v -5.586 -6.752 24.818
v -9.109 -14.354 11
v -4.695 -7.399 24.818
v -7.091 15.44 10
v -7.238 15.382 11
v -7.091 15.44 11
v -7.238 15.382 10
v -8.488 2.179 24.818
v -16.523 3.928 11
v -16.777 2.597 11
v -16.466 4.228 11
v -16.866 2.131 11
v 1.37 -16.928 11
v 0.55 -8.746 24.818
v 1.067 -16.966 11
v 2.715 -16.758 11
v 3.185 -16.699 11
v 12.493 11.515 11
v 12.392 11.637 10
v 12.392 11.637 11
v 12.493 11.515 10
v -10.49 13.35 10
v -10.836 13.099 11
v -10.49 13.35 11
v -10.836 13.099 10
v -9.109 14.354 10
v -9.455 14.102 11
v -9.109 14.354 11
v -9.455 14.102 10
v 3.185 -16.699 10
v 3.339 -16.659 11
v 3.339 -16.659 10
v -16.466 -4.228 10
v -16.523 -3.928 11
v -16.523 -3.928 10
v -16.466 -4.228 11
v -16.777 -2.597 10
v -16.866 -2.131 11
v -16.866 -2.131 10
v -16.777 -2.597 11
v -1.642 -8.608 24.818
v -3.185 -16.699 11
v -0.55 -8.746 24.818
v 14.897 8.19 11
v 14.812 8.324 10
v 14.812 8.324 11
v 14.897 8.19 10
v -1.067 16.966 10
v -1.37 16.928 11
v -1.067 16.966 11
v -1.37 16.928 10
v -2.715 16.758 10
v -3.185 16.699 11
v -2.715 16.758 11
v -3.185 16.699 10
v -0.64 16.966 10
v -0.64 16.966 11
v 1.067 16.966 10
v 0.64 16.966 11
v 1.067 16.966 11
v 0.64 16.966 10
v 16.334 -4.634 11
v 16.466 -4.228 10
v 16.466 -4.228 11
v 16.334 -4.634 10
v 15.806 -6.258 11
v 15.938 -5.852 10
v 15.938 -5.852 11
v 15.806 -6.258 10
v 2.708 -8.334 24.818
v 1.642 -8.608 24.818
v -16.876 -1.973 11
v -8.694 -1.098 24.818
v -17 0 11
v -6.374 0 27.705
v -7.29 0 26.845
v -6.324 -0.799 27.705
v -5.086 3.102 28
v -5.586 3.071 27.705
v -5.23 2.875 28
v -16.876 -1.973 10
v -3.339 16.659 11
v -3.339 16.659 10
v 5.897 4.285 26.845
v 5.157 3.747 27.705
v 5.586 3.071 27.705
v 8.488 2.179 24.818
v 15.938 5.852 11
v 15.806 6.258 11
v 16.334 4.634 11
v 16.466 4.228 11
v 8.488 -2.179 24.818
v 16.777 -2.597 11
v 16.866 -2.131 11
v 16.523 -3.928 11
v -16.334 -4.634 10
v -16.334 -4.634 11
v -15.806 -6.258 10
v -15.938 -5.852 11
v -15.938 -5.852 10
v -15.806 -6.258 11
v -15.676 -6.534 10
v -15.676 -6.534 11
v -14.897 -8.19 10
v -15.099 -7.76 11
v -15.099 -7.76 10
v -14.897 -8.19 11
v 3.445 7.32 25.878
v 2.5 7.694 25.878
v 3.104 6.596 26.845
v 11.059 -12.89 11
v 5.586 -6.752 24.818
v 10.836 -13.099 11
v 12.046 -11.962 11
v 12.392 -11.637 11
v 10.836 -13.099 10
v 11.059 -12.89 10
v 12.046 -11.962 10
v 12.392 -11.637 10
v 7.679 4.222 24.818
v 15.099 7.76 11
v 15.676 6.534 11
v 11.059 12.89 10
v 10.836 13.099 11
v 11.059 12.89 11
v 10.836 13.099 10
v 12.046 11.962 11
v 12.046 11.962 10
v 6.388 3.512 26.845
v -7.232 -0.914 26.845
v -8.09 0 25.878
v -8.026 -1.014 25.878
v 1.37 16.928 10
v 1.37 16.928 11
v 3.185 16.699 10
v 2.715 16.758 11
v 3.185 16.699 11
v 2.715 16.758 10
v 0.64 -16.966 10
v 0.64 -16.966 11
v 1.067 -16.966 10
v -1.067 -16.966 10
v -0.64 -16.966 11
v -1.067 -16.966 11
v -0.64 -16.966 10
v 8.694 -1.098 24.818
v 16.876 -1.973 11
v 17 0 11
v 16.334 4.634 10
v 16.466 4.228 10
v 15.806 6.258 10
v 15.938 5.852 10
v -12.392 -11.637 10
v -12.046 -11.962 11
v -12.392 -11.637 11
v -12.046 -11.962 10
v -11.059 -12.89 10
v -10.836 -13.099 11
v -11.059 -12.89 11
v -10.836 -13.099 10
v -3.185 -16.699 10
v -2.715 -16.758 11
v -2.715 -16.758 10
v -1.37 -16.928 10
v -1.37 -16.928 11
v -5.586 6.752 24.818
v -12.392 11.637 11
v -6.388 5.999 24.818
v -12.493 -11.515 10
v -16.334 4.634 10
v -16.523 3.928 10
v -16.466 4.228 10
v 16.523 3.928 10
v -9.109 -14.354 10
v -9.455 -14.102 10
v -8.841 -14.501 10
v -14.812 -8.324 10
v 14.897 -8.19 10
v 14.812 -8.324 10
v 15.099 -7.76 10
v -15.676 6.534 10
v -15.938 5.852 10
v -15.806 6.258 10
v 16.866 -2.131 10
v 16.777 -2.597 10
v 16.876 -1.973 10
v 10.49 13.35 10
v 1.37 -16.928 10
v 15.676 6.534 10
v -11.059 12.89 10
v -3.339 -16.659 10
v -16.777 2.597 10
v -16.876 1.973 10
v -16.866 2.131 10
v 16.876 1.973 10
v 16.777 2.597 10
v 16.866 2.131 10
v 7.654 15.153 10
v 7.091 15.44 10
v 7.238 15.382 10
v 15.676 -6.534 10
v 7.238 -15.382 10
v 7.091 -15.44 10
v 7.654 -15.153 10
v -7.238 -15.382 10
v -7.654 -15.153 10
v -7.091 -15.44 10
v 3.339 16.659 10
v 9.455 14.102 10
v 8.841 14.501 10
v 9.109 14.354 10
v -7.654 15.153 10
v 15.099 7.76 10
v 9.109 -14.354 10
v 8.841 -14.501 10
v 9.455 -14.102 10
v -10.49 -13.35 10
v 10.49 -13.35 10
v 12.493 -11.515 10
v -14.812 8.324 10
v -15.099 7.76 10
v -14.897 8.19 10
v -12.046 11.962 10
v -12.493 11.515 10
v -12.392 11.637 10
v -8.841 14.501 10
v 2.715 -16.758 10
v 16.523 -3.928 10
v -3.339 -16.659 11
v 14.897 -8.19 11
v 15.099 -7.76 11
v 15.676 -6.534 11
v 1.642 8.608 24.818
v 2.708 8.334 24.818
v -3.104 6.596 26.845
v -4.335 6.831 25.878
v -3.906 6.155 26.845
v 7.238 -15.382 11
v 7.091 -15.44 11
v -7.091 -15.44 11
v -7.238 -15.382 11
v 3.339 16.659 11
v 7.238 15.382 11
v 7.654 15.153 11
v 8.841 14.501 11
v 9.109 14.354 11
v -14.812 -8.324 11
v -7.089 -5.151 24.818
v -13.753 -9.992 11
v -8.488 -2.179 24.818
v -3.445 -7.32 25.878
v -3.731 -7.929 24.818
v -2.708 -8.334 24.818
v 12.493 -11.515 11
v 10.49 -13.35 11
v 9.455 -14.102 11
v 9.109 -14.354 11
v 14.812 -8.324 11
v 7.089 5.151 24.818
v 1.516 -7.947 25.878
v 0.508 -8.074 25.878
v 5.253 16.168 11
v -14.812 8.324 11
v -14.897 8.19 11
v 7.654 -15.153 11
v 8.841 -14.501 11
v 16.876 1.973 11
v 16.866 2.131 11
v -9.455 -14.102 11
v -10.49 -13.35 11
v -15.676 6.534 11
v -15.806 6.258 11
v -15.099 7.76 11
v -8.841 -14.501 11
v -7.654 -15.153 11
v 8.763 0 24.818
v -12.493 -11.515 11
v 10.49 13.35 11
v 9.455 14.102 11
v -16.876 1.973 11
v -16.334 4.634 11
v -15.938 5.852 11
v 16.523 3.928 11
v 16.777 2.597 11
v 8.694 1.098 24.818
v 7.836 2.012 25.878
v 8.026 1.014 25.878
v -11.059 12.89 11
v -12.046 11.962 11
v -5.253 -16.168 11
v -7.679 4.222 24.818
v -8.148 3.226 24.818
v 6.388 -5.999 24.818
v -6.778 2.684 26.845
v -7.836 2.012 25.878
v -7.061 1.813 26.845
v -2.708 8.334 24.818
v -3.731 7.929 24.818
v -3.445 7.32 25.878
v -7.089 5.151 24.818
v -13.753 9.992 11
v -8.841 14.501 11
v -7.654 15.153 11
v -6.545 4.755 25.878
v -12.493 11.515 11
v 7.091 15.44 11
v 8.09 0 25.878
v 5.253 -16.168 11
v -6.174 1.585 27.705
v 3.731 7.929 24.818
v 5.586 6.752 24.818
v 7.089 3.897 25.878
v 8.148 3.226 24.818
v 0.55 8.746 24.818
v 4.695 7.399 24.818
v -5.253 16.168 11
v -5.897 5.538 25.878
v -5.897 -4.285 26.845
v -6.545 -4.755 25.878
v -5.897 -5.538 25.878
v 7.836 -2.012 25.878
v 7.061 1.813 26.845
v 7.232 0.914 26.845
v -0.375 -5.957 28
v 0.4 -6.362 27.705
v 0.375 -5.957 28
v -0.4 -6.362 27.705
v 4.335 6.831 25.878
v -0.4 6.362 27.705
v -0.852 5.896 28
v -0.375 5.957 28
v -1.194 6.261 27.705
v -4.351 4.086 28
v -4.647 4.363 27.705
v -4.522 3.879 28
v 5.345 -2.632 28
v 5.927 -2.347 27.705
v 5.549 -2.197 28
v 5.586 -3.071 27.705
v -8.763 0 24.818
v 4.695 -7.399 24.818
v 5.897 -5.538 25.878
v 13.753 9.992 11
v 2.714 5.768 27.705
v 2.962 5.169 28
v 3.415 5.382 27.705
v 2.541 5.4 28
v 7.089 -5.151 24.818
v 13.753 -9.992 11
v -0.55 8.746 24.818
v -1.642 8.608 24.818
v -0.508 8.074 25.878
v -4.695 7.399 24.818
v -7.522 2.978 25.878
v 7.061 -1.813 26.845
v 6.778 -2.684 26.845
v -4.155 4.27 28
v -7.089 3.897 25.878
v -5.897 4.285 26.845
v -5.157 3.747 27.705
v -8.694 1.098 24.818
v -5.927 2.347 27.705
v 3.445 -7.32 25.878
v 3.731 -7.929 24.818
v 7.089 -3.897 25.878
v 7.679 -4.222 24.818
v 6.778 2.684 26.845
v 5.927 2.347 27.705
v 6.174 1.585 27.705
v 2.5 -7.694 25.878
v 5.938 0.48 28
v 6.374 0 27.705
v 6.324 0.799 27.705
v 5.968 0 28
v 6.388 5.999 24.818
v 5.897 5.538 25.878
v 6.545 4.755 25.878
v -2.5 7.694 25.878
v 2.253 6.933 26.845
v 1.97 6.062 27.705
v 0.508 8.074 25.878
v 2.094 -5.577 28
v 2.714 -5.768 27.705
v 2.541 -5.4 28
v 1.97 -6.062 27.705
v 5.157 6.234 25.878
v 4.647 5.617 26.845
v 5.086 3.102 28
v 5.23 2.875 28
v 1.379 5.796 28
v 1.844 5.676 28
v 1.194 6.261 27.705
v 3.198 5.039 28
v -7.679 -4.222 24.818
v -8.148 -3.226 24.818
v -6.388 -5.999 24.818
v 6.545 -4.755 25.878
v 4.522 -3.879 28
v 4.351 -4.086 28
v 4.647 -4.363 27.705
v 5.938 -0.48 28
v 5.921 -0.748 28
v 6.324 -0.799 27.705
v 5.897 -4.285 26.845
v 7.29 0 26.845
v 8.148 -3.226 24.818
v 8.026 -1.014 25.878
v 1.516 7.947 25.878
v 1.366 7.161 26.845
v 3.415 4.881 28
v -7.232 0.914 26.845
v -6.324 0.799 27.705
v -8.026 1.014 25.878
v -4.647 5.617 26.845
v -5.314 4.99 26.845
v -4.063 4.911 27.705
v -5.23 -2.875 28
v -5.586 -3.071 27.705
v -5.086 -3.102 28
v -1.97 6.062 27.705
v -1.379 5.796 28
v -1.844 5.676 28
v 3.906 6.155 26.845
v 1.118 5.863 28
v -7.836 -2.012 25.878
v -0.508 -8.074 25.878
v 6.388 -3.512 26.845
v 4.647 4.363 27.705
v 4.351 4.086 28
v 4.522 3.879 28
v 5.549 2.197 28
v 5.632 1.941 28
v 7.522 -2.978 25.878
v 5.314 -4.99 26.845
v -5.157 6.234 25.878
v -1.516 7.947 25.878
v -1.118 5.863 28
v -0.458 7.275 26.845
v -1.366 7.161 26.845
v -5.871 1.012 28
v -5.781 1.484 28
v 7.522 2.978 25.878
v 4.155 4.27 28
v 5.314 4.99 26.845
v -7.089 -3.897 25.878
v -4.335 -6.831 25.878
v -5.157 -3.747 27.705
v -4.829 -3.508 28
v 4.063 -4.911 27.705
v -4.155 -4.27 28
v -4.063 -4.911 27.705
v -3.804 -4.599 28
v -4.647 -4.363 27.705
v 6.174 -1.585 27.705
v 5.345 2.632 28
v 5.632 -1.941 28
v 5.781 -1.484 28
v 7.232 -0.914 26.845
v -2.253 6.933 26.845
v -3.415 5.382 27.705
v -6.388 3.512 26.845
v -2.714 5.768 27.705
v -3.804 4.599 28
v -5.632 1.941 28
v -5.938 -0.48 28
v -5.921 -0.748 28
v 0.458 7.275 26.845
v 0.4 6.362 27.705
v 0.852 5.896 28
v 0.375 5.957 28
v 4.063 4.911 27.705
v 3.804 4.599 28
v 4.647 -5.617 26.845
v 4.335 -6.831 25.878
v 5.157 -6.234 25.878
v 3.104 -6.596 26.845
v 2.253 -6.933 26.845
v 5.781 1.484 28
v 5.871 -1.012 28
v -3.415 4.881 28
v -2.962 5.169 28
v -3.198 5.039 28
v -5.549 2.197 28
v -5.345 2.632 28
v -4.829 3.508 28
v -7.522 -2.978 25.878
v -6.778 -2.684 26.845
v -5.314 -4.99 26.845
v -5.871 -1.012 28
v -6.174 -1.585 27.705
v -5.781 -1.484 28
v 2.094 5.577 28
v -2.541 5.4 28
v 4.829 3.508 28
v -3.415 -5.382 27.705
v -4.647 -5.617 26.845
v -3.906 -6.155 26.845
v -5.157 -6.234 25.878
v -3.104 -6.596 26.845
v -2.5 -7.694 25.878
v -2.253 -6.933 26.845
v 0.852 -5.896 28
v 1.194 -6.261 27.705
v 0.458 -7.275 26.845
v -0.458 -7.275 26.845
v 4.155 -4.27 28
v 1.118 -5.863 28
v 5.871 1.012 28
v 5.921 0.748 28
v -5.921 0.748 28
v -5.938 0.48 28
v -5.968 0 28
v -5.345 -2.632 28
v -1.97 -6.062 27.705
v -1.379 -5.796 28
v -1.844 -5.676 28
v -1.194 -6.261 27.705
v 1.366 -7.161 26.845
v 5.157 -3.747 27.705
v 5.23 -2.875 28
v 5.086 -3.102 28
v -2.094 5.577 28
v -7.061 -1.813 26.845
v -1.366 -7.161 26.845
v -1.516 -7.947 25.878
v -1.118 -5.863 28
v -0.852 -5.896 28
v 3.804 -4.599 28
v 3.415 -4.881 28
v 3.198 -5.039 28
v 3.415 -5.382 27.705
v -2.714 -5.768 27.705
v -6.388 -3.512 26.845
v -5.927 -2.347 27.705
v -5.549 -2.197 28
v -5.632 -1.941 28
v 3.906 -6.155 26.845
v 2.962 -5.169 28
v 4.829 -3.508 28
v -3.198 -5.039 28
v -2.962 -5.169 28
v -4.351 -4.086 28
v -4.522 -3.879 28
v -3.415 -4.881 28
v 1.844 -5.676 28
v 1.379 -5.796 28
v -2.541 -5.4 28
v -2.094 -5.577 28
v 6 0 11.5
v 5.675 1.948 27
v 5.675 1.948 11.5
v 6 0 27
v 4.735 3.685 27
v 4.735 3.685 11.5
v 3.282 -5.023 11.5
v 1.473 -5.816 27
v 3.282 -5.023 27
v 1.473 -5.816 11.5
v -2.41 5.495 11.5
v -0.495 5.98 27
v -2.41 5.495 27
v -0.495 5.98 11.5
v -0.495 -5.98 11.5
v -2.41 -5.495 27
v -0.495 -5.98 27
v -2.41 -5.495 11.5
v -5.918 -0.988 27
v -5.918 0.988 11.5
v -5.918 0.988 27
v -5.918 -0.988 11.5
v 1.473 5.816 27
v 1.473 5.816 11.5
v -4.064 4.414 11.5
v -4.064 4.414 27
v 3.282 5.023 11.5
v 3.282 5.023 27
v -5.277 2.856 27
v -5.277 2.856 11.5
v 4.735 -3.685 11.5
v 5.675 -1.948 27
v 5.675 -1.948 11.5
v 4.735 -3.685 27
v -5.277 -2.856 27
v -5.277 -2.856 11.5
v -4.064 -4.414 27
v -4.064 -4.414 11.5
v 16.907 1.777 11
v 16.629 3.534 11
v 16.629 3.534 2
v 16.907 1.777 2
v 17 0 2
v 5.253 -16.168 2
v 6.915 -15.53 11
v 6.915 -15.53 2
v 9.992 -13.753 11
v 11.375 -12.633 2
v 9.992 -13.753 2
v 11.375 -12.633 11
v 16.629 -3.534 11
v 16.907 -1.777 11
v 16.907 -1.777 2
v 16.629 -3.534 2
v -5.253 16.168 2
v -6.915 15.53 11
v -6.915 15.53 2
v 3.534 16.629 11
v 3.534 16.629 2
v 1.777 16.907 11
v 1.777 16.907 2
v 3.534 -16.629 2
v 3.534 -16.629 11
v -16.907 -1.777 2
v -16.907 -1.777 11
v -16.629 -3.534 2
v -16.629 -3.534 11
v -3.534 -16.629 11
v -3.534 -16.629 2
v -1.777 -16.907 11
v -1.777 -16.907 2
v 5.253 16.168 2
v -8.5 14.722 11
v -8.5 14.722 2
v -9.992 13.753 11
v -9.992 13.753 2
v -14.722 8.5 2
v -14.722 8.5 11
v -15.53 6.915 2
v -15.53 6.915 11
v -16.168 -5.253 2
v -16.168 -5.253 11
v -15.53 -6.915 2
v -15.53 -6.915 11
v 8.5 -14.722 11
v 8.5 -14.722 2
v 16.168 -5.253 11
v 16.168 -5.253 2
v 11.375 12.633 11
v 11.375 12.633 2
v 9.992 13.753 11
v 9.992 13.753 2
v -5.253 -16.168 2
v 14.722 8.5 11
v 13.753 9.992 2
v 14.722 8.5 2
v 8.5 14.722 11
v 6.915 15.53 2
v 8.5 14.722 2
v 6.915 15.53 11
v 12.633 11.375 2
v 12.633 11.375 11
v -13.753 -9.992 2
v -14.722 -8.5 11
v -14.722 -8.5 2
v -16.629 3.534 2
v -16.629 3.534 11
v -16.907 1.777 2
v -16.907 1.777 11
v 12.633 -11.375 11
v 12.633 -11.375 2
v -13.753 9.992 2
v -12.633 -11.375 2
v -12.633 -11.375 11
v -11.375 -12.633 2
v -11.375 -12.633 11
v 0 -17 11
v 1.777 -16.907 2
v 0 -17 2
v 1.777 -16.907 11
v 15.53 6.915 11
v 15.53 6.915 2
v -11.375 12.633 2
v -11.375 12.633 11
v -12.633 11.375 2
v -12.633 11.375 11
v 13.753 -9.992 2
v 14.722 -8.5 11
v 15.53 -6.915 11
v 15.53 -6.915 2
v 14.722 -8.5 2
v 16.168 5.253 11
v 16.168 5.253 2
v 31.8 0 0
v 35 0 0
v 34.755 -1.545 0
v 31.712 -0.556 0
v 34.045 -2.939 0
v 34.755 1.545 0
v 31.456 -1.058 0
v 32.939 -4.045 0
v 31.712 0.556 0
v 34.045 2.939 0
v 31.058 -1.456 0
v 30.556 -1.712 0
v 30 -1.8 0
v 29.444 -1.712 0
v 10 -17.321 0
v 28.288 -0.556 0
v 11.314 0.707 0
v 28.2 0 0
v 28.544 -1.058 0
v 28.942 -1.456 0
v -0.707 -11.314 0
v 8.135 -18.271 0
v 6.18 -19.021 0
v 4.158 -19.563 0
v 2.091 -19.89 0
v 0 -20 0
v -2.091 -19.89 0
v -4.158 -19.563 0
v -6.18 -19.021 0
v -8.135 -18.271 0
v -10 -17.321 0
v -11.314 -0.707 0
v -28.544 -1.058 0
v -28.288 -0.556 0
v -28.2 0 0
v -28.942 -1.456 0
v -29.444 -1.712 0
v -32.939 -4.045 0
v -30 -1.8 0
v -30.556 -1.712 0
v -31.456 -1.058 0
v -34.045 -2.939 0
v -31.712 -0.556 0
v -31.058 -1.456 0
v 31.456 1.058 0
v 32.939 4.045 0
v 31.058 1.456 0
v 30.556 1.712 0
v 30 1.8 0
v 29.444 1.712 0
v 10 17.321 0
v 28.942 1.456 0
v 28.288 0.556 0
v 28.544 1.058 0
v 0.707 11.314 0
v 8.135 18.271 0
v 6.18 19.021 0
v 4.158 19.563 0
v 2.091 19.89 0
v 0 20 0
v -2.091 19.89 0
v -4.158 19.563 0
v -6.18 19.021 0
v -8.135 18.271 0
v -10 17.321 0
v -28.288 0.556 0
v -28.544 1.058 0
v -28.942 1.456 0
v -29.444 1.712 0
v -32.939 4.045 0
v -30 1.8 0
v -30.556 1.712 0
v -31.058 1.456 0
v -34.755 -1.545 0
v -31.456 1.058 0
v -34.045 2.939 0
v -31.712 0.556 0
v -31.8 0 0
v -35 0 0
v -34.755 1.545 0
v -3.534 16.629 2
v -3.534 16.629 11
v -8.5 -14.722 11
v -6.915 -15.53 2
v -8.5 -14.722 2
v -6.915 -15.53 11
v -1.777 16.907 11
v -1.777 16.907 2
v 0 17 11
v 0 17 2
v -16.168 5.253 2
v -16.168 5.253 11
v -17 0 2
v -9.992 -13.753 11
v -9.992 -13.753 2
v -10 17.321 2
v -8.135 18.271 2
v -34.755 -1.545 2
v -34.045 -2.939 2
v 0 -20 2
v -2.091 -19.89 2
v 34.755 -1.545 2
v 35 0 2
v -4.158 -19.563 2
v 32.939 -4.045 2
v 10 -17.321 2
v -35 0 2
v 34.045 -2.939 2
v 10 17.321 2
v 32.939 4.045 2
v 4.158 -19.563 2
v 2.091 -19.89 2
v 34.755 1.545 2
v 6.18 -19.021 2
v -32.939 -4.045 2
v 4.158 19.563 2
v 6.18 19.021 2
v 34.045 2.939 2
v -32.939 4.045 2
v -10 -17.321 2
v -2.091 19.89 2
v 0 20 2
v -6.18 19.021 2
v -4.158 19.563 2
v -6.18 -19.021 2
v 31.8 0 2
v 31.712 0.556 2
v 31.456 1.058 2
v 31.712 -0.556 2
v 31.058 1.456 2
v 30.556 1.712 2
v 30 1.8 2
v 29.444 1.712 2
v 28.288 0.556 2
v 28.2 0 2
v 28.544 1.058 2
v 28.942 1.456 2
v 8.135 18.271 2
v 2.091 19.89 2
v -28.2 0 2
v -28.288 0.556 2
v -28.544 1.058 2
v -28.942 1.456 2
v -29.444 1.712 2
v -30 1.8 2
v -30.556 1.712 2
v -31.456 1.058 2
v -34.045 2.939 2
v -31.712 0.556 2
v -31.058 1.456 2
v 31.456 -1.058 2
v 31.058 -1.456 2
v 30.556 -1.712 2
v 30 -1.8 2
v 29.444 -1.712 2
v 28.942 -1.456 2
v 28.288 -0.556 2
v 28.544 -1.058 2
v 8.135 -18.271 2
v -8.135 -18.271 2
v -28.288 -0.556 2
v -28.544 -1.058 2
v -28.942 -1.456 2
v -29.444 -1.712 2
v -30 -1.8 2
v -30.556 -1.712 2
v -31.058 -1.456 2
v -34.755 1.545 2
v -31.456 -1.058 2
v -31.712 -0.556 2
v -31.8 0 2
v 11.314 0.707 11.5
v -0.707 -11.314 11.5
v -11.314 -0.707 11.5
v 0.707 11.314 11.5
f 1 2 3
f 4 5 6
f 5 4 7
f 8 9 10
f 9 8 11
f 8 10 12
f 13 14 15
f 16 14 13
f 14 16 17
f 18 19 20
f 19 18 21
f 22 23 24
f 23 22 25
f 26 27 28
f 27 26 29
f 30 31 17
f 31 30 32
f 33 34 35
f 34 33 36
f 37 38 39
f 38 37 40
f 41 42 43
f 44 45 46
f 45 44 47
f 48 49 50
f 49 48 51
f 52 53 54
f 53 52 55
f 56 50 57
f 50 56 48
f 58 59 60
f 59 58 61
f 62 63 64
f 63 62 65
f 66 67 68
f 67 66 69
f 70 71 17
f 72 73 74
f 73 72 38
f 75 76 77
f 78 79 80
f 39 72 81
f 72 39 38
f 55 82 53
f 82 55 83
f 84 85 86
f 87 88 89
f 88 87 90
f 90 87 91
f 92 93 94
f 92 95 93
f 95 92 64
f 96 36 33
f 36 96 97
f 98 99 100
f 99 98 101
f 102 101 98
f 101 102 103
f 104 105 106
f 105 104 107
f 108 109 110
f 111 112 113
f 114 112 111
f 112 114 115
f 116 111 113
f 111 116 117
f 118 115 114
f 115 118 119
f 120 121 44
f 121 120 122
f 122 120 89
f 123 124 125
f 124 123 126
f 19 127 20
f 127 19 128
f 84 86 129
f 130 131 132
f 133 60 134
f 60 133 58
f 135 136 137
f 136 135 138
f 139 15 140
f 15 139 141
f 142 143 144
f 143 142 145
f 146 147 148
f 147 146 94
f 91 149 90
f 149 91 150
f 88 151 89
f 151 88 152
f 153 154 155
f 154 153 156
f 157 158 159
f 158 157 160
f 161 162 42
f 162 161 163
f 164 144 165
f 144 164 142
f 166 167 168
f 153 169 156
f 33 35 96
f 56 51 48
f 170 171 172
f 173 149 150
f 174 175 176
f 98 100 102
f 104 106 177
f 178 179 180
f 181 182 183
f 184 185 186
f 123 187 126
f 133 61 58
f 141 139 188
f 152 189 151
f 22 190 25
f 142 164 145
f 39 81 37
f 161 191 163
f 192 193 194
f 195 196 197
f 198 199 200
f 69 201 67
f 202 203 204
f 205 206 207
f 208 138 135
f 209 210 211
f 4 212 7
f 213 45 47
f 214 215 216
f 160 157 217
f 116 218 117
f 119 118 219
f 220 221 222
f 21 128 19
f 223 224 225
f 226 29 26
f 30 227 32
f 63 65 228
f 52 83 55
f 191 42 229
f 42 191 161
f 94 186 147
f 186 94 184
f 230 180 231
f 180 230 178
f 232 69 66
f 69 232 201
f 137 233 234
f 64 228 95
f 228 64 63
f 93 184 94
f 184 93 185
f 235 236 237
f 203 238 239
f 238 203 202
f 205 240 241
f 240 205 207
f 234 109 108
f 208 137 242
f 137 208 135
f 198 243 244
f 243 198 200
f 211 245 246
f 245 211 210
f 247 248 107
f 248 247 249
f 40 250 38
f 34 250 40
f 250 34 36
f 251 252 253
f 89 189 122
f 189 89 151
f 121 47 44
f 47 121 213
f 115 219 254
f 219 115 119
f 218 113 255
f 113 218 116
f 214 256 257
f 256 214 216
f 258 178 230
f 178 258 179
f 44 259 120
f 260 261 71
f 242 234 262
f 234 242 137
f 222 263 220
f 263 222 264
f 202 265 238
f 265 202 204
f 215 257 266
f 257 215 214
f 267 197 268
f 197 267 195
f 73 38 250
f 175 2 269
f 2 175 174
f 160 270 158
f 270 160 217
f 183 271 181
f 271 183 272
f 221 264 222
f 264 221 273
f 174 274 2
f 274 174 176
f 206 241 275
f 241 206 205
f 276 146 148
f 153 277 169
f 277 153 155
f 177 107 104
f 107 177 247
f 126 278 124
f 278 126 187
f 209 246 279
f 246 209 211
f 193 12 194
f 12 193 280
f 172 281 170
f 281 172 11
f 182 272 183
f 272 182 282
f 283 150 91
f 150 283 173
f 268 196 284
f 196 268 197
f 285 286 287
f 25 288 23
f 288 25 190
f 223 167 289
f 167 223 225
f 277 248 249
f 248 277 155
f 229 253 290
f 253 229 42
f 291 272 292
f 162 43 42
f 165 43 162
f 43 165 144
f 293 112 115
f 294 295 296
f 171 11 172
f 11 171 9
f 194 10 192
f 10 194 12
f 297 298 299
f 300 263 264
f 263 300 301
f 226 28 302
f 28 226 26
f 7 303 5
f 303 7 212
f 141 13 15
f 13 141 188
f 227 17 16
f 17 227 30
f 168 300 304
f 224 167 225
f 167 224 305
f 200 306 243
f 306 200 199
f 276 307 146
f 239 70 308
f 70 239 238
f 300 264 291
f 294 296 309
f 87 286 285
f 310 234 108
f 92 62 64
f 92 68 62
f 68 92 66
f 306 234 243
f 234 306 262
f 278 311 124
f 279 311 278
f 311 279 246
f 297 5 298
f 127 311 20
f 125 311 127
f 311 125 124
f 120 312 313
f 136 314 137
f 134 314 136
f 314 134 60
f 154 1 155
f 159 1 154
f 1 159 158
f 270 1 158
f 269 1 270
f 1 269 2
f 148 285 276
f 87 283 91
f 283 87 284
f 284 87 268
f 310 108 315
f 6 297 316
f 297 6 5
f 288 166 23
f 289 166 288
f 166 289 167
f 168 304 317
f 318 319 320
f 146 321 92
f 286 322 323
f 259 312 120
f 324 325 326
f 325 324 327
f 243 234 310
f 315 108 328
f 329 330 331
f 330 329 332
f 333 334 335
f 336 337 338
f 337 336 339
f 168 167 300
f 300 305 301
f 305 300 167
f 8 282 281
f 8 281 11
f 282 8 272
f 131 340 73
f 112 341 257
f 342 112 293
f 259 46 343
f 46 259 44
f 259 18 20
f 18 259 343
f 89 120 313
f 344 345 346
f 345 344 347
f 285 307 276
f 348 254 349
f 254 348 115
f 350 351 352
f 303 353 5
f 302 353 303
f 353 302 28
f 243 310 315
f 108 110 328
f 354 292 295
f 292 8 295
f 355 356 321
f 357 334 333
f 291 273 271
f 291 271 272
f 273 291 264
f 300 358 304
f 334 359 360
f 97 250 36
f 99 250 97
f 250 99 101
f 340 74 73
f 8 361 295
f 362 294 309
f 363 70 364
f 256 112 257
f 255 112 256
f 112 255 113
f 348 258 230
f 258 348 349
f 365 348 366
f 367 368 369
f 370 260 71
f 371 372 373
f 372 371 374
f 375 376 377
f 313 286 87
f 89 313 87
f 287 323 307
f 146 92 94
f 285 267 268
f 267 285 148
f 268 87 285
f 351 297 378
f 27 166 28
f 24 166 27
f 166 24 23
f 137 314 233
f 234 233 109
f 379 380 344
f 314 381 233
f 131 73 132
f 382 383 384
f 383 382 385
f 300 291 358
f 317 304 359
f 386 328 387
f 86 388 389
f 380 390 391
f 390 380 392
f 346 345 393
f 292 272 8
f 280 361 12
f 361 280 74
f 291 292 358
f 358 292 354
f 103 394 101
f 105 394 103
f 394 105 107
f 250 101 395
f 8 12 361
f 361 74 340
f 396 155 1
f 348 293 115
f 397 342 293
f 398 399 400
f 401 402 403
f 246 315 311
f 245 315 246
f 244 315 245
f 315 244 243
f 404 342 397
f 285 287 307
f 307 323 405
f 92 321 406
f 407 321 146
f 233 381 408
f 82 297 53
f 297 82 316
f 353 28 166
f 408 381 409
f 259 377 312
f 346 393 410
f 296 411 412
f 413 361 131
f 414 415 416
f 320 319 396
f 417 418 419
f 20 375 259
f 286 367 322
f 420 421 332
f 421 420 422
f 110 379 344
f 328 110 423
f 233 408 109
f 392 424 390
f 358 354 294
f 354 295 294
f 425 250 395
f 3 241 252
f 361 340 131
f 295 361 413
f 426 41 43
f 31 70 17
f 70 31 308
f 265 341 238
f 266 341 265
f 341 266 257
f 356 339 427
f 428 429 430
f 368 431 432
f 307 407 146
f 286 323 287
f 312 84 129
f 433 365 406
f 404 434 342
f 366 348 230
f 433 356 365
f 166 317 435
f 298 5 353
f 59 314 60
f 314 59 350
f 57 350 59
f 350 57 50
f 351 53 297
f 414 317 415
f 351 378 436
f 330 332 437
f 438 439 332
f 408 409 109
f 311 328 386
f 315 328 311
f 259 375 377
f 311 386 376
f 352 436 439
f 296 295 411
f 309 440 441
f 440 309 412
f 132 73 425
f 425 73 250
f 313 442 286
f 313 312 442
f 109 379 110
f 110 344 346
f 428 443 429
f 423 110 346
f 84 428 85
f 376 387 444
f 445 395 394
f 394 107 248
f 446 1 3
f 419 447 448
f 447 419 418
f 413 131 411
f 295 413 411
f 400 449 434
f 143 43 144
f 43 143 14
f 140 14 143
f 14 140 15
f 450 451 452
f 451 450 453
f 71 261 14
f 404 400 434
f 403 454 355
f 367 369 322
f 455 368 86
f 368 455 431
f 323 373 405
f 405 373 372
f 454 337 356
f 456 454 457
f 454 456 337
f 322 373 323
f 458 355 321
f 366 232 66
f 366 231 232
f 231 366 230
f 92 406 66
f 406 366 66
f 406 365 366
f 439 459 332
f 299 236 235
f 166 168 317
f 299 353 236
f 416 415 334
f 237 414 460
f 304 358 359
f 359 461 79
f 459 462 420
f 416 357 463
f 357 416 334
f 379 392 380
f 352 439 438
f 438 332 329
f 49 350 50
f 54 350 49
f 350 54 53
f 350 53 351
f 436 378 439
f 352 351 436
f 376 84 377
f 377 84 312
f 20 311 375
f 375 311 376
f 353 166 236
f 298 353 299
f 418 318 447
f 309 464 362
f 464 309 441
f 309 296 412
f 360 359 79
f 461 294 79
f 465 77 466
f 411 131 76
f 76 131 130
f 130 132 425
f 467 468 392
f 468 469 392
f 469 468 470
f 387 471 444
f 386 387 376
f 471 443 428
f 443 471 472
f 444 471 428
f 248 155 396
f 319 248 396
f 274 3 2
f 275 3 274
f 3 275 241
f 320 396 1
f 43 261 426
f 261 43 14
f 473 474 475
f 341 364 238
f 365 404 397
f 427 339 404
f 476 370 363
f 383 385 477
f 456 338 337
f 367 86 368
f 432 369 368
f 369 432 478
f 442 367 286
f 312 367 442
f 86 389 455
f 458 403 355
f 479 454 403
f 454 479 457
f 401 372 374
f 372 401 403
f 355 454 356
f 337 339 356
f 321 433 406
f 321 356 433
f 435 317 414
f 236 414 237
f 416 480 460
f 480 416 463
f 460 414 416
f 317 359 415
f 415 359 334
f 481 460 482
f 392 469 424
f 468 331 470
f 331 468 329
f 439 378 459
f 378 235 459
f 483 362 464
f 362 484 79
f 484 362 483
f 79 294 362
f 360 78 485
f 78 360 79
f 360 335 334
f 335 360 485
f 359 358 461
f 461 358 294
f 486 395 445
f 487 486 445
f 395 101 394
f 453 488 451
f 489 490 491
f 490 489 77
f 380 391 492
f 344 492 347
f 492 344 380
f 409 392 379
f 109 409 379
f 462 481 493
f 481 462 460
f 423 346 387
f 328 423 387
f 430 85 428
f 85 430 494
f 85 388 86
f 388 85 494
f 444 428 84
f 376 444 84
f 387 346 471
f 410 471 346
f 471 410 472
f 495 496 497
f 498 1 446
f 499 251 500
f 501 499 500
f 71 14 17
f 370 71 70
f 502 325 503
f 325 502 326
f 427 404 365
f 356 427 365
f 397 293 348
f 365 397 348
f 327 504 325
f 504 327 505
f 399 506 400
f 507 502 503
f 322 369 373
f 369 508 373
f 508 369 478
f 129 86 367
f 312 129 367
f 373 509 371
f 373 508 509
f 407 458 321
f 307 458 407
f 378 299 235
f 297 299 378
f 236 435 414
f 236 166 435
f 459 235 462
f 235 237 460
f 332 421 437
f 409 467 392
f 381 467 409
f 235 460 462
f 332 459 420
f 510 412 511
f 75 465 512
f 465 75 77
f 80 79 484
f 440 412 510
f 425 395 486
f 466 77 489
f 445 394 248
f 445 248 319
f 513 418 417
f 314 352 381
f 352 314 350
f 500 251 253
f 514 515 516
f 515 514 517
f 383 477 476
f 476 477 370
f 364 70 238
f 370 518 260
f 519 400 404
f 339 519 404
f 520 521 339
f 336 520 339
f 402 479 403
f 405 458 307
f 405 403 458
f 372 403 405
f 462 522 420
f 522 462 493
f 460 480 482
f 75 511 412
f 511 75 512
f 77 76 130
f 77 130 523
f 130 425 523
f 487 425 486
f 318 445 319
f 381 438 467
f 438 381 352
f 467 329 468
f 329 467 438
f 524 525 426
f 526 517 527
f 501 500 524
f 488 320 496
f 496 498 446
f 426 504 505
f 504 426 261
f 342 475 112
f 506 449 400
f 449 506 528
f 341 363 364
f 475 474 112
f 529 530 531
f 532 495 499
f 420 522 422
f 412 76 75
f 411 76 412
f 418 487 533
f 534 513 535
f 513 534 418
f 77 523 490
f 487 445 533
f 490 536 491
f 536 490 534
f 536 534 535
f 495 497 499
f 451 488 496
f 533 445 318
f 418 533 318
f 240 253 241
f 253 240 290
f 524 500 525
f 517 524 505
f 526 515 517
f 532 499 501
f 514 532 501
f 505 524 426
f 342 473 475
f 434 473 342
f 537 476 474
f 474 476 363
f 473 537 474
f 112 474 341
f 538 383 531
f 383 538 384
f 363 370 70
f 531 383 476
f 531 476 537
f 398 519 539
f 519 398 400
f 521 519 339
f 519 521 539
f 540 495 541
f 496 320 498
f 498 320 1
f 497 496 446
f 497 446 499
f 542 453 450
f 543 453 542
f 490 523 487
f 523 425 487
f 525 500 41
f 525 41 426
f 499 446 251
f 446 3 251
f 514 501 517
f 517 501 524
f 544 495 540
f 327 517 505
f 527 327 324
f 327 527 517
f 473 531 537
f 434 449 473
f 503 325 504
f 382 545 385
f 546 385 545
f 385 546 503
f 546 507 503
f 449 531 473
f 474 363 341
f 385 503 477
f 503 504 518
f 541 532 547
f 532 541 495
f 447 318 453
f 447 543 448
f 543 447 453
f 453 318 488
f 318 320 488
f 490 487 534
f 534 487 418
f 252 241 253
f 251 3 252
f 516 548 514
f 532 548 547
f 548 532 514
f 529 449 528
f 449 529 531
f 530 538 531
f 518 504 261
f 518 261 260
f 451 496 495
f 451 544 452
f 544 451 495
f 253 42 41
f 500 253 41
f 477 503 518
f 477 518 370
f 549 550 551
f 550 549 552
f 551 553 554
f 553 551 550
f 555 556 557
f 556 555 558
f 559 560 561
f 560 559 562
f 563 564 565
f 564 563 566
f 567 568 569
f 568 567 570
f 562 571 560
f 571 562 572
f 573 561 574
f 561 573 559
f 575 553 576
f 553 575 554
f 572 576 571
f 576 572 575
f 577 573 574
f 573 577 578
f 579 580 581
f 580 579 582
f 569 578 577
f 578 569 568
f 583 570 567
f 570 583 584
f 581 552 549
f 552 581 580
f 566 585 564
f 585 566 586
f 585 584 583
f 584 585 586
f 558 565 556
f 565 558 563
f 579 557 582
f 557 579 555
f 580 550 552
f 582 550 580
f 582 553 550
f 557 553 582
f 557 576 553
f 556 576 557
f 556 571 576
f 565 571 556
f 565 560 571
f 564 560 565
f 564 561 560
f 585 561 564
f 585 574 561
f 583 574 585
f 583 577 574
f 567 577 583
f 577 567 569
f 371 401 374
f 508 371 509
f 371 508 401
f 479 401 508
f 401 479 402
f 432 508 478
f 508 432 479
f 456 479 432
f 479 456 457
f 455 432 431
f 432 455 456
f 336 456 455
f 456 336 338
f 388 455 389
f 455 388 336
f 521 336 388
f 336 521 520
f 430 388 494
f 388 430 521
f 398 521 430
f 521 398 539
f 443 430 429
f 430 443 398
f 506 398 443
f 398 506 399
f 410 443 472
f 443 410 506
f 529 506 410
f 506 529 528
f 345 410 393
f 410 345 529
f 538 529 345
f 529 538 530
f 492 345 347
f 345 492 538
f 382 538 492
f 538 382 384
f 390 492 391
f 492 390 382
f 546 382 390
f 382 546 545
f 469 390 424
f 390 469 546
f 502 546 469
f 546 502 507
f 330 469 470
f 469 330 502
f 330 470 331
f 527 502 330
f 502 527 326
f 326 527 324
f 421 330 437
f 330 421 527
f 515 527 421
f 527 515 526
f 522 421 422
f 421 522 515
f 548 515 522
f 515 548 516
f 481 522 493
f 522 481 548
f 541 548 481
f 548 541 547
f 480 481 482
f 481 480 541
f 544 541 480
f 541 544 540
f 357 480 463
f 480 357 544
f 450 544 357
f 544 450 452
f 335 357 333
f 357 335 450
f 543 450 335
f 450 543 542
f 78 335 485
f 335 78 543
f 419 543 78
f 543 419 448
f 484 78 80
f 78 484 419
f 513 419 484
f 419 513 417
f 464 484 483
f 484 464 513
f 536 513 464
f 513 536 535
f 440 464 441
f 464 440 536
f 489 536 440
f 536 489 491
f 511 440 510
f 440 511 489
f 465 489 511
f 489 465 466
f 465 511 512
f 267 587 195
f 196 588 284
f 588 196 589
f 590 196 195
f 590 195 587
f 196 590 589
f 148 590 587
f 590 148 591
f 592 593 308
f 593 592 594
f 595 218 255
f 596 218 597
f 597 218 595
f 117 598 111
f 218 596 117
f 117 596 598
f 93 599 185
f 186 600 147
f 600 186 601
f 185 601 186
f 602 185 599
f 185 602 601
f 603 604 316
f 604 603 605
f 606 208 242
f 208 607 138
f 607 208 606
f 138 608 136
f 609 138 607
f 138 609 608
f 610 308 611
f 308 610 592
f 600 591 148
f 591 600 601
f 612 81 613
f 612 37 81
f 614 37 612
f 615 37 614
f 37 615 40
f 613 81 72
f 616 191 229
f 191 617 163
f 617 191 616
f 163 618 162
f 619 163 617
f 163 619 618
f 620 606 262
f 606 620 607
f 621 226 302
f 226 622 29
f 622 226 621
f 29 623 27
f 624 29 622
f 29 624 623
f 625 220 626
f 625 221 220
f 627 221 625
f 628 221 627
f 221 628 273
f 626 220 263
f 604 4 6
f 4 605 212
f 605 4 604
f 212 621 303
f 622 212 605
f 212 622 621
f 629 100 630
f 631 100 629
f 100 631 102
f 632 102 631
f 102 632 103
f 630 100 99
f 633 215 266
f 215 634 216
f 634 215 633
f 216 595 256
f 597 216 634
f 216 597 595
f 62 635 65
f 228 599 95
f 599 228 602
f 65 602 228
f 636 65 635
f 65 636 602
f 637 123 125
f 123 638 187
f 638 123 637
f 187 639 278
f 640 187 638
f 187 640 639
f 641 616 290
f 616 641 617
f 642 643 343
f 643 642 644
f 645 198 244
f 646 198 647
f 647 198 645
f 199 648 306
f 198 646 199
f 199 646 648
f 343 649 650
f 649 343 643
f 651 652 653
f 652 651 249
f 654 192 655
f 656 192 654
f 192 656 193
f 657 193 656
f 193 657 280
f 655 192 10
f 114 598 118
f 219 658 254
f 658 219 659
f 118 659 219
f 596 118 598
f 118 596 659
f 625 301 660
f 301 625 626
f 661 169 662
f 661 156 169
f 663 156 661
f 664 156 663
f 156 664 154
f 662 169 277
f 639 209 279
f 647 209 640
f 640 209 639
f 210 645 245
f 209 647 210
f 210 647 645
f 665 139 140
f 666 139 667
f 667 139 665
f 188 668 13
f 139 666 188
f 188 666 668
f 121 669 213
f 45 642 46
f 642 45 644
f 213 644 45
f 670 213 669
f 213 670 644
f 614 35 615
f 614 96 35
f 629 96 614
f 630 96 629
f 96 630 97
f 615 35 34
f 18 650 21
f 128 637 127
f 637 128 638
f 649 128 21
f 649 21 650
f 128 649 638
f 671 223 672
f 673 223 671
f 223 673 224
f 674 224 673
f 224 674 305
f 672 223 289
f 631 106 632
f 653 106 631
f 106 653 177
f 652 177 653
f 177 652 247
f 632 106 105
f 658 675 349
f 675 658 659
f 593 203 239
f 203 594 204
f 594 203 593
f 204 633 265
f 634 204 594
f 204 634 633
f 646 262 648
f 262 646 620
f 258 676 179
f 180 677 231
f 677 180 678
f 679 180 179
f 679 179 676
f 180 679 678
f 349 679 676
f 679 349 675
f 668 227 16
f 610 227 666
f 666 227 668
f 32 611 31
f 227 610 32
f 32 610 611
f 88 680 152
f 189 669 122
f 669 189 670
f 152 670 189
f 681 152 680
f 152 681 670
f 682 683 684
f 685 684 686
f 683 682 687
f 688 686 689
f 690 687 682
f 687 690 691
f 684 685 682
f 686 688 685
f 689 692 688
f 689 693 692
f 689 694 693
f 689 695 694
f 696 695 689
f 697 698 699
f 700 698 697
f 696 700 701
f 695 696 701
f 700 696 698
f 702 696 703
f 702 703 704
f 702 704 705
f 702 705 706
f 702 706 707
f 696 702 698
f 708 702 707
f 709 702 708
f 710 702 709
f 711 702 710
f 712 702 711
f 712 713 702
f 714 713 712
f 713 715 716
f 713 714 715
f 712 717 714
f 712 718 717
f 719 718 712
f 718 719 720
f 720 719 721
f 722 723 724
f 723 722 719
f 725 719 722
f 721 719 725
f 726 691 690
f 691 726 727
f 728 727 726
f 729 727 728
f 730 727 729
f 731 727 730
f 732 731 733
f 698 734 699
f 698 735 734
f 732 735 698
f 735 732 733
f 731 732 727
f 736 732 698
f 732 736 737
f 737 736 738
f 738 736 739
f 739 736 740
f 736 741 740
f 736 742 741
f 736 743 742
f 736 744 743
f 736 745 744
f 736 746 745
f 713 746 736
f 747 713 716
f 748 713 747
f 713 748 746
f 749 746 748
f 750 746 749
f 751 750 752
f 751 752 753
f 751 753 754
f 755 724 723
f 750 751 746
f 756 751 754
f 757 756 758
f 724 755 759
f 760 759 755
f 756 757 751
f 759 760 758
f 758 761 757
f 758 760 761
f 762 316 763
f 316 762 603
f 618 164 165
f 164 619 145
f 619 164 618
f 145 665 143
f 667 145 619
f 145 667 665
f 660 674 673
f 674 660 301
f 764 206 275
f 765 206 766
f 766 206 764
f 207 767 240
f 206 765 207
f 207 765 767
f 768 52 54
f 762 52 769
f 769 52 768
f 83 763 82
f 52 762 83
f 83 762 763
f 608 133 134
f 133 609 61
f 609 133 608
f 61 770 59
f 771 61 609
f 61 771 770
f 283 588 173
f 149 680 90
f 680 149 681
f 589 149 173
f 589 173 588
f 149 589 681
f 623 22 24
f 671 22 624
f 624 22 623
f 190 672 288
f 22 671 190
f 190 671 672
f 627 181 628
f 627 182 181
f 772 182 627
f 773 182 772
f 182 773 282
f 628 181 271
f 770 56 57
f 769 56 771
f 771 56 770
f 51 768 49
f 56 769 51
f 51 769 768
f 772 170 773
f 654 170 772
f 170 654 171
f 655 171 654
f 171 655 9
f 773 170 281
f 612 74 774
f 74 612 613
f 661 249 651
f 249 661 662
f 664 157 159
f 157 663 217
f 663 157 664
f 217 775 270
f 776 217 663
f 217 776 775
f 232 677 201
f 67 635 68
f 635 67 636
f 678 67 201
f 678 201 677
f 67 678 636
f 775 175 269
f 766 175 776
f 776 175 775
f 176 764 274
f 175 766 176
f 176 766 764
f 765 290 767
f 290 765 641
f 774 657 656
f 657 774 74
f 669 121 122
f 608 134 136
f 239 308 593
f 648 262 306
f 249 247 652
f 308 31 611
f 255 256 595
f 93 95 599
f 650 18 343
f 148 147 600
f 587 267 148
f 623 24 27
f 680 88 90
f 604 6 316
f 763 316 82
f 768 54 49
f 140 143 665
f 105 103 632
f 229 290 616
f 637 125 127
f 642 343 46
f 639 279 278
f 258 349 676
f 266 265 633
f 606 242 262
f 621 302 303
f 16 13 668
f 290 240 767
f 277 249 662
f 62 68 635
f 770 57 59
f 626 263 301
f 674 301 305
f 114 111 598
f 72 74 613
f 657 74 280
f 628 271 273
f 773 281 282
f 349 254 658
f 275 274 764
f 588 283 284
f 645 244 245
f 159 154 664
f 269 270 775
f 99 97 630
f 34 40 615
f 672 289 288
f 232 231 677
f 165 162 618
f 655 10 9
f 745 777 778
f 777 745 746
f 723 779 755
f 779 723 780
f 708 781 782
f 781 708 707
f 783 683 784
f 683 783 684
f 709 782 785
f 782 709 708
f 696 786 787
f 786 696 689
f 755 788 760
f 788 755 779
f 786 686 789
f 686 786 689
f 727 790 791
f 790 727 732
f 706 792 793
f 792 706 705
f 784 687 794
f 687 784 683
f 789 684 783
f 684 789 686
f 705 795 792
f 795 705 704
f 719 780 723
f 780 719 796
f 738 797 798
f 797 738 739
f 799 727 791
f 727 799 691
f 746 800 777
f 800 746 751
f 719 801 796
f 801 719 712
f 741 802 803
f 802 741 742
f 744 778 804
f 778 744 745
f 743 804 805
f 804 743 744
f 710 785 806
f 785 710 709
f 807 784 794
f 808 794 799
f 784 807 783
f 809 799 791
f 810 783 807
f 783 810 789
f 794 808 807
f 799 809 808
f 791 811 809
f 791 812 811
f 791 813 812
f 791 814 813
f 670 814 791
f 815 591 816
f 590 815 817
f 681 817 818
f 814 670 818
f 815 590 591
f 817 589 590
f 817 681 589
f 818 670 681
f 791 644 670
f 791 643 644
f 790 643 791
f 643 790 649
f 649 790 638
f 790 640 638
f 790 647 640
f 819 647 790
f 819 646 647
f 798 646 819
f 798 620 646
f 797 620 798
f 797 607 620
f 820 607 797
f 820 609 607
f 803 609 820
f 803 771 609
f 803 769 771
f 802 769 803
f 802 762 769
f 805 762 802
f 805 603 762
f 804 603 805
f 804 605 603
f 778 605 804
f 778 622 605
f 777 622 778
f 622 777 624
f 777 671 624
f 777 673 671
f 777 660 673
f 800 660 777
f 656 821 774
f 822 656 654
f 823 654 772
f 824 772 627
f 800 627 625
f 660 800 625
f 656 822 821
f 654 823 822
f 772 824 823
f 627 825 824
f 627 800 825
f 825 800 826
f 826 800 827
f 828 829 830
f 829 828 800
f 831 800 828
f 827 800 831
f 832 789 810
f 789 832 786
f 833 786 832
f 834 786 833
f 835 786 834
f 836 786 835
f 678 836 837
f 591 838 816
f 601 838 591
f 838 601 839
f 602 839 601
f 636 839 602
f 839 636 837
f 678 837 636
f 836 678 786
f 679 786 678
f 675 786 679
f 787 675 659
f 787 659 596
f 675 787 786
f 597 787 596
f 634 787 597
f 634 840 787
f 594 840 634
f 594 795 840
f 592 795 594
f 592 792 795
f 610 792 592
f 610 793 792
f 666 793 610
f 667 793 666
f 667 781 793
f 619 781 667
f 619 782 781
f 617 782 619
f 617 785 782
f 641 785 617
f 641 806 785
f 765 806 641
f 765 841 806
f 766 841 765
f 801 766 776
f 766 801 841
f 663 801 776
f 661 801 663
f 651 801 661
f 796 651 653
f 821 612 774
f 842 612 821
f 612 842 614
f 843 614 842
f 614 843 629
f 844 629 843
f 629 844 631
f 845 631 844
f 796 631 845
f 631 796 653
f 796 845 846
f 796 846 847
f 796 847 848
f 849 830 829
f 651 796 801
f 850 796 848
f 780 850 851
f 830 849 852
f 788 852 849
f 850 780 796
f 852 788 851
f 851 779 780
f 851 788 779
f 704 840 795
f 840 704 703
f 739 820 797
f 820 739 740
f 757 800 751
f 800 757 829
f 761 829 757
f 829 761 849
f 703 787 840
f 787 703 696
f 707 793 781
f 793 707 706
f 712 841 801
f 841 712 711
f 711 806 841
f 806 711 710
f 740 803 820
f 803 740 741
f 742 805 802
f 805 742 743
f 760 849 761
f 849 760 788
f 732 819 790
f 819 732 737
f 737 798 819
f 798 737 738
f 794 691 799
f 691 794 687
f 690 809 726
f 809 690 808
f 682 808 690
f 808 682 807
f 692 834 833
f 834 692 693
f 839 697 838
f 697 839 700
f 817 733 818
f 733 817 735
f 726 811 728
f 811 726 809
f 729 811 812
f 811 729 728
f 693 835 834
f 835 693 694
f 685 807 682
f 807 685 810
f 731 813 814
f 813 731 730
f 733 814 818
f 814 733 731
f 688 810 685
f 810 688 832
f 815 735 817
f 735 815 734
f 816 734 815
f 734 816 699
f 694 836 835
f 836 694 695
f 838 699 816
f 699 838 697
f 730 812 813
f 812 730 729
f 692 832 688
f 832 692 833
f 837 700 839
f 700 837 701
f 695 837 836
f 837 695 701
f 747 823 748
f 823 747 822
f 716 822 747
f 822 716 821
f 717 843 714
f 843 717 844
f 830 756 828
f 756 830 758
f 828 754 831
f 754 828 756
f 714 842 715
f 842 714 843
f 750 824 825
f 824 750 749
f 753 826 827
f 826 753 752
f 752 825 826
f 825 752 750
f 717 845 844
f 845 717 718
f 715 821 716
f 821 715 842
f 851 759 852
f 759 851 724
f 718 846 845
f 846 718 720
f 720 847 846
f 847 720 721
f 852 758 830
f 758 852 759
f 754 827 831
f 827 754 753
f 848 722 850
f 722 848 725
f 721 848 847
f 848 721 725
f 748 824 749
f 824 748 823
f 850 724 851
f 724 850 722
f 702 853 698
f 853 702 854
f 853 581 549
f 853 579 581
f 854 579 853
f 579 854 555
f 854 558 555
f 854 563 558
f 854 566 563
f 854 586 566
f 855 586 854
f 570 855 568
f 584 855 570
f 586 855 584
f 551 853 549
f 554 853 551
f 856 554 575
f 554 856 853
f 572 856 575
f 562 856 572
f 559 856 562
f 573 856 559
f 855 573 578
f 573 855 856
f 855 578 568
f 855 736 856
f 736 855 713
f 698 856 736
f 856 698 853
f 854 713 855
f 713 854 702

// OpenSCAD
//Opciones de pivotes

module A(){
	difference(){
		union(){
			cylinder(r=13/2,h=30);
			translate([0,0,30])sphere(13/2);
		}
		translate([0,0,-1])cylinder(r=11/2,h=31);
	}
}

module B(){
	difference(){
		union(){
			cylinder(r1=20/2,r2=13/2,h=30);
			translate([0,0,30])sphere(13/2);
		}
		translate([0,0,-1])cylinder(r=11/2,h=31);
	}
}

module C(){
	difference(){
		union(){
			cylinder(r=13/2,h=20);
			translate([0,0,18])sphere(16/2);
		}
		translate([0,0,-1])cylinder(r=11/2,h=23);
		//translate([0,0,15])cube(20);
	}
}

module D(ajuste){
	difference(){
		union(){
			cylinder(r=13/2,h=30);
			translate([0,0,30])cylinder(r1=13/2,r2=4,h=2);
		}
		translate([0,0,-1])cylinder(r=11/2,h=30);
		//translate([0,0,15])cube(20);
		translate([0,0,29.5+ajuste])sphere(ajuste);

	}
}

module E(ajuste){
	difference(){
		union(){
			cylinder(r1=16,r2=7,h=16,$fn=6);


		}
		translate([0,0,-1])cylinder(r=12/2,h=16);
		//translate([0,0,10])cube(20);

	}
}

module F(ajuste){
	difference(){
		hull(){
			cylinder(r=20,h=1,$fn=50);
			translate([0,0,6-ajuste])sphere(20,$fn=100);


		}
		translate([0,0,-1])cylinder(r=12/2,h=25-ajuste);
		//translate([0,0,10])cube(20);
		translate([0,0,-50])cube(100, center=true);
		translate([0,0,74.8-ajuste])cube(100, center=true);

	}
}

module G(ajuste){
	difference(){
		hull(){
			cylinder(r=17,h=1,$fn=50);
			translate([0,0,10])sphere(10,$fn=50);


		}
		translate([0,0,-1])cylinder(r=12/2,h=24-ajuste);
		//translate([0,0,10])cube(20);
		translate([0,0,-50])cube(100, center=true);
		translate([0,0,74-ajuste])cube(100, center=true);

	}
}

module H(ajuste){
	difference(){
		hull(){
			cylinder(r=17,h=1,$fn=50);
			translate([0,0,10])sphere(10,$fn=50);


		}
		translate([0,0,-1])cylinder(r=12/2,h=24-ajuste);
		//translate([0,0,10])cube(20);
		translate([0,0,-50])cube(100, center=true);
		translate([0,0,74-ajuste])cube(100, center=true);

	}
}

module base(){
	difference(){
		translate([-30,-30,0])cube([60,60,10]);
		translate([-28,-28,2])cube([56,56,15]);
		translate([0,0,-1])cylinder(r=12/2,h=23);		
	}
}

module agujeros(){

		translate([5,30,0])cylinder(r=1.8,h=40,$fn=20);
		translate([39,8,0])cylinder(r=1.8,h=40,$fn=20);
		translate([8.5,13.5,0])rotate([0,90,0])translate([0,-1,3])rotate([0,-90,0])cylinder(r=6.5,h=40);
}

difference(){
	union(){
		translate([0,0,10])H(6);
		cylinder(r=17,h=11,$fn=60);
		hull(){
			cylinder(r=20,h=2,$fn=60);
			translate([30,0,0])cylinder(r=5,h=2,$fn=20);
			translate([-30,0,0])cylinder(r=5,h=2,$fn=20);
		}
	}
	translate([30,0,-1])cylinder(r=1.8,h=4,$fn=20);
	translate([-30,0,-1])cylinder(r=1.8,h=4,$fn=20);
	rotate([0,0,-45])cube([15,17,23],center=true);
}
